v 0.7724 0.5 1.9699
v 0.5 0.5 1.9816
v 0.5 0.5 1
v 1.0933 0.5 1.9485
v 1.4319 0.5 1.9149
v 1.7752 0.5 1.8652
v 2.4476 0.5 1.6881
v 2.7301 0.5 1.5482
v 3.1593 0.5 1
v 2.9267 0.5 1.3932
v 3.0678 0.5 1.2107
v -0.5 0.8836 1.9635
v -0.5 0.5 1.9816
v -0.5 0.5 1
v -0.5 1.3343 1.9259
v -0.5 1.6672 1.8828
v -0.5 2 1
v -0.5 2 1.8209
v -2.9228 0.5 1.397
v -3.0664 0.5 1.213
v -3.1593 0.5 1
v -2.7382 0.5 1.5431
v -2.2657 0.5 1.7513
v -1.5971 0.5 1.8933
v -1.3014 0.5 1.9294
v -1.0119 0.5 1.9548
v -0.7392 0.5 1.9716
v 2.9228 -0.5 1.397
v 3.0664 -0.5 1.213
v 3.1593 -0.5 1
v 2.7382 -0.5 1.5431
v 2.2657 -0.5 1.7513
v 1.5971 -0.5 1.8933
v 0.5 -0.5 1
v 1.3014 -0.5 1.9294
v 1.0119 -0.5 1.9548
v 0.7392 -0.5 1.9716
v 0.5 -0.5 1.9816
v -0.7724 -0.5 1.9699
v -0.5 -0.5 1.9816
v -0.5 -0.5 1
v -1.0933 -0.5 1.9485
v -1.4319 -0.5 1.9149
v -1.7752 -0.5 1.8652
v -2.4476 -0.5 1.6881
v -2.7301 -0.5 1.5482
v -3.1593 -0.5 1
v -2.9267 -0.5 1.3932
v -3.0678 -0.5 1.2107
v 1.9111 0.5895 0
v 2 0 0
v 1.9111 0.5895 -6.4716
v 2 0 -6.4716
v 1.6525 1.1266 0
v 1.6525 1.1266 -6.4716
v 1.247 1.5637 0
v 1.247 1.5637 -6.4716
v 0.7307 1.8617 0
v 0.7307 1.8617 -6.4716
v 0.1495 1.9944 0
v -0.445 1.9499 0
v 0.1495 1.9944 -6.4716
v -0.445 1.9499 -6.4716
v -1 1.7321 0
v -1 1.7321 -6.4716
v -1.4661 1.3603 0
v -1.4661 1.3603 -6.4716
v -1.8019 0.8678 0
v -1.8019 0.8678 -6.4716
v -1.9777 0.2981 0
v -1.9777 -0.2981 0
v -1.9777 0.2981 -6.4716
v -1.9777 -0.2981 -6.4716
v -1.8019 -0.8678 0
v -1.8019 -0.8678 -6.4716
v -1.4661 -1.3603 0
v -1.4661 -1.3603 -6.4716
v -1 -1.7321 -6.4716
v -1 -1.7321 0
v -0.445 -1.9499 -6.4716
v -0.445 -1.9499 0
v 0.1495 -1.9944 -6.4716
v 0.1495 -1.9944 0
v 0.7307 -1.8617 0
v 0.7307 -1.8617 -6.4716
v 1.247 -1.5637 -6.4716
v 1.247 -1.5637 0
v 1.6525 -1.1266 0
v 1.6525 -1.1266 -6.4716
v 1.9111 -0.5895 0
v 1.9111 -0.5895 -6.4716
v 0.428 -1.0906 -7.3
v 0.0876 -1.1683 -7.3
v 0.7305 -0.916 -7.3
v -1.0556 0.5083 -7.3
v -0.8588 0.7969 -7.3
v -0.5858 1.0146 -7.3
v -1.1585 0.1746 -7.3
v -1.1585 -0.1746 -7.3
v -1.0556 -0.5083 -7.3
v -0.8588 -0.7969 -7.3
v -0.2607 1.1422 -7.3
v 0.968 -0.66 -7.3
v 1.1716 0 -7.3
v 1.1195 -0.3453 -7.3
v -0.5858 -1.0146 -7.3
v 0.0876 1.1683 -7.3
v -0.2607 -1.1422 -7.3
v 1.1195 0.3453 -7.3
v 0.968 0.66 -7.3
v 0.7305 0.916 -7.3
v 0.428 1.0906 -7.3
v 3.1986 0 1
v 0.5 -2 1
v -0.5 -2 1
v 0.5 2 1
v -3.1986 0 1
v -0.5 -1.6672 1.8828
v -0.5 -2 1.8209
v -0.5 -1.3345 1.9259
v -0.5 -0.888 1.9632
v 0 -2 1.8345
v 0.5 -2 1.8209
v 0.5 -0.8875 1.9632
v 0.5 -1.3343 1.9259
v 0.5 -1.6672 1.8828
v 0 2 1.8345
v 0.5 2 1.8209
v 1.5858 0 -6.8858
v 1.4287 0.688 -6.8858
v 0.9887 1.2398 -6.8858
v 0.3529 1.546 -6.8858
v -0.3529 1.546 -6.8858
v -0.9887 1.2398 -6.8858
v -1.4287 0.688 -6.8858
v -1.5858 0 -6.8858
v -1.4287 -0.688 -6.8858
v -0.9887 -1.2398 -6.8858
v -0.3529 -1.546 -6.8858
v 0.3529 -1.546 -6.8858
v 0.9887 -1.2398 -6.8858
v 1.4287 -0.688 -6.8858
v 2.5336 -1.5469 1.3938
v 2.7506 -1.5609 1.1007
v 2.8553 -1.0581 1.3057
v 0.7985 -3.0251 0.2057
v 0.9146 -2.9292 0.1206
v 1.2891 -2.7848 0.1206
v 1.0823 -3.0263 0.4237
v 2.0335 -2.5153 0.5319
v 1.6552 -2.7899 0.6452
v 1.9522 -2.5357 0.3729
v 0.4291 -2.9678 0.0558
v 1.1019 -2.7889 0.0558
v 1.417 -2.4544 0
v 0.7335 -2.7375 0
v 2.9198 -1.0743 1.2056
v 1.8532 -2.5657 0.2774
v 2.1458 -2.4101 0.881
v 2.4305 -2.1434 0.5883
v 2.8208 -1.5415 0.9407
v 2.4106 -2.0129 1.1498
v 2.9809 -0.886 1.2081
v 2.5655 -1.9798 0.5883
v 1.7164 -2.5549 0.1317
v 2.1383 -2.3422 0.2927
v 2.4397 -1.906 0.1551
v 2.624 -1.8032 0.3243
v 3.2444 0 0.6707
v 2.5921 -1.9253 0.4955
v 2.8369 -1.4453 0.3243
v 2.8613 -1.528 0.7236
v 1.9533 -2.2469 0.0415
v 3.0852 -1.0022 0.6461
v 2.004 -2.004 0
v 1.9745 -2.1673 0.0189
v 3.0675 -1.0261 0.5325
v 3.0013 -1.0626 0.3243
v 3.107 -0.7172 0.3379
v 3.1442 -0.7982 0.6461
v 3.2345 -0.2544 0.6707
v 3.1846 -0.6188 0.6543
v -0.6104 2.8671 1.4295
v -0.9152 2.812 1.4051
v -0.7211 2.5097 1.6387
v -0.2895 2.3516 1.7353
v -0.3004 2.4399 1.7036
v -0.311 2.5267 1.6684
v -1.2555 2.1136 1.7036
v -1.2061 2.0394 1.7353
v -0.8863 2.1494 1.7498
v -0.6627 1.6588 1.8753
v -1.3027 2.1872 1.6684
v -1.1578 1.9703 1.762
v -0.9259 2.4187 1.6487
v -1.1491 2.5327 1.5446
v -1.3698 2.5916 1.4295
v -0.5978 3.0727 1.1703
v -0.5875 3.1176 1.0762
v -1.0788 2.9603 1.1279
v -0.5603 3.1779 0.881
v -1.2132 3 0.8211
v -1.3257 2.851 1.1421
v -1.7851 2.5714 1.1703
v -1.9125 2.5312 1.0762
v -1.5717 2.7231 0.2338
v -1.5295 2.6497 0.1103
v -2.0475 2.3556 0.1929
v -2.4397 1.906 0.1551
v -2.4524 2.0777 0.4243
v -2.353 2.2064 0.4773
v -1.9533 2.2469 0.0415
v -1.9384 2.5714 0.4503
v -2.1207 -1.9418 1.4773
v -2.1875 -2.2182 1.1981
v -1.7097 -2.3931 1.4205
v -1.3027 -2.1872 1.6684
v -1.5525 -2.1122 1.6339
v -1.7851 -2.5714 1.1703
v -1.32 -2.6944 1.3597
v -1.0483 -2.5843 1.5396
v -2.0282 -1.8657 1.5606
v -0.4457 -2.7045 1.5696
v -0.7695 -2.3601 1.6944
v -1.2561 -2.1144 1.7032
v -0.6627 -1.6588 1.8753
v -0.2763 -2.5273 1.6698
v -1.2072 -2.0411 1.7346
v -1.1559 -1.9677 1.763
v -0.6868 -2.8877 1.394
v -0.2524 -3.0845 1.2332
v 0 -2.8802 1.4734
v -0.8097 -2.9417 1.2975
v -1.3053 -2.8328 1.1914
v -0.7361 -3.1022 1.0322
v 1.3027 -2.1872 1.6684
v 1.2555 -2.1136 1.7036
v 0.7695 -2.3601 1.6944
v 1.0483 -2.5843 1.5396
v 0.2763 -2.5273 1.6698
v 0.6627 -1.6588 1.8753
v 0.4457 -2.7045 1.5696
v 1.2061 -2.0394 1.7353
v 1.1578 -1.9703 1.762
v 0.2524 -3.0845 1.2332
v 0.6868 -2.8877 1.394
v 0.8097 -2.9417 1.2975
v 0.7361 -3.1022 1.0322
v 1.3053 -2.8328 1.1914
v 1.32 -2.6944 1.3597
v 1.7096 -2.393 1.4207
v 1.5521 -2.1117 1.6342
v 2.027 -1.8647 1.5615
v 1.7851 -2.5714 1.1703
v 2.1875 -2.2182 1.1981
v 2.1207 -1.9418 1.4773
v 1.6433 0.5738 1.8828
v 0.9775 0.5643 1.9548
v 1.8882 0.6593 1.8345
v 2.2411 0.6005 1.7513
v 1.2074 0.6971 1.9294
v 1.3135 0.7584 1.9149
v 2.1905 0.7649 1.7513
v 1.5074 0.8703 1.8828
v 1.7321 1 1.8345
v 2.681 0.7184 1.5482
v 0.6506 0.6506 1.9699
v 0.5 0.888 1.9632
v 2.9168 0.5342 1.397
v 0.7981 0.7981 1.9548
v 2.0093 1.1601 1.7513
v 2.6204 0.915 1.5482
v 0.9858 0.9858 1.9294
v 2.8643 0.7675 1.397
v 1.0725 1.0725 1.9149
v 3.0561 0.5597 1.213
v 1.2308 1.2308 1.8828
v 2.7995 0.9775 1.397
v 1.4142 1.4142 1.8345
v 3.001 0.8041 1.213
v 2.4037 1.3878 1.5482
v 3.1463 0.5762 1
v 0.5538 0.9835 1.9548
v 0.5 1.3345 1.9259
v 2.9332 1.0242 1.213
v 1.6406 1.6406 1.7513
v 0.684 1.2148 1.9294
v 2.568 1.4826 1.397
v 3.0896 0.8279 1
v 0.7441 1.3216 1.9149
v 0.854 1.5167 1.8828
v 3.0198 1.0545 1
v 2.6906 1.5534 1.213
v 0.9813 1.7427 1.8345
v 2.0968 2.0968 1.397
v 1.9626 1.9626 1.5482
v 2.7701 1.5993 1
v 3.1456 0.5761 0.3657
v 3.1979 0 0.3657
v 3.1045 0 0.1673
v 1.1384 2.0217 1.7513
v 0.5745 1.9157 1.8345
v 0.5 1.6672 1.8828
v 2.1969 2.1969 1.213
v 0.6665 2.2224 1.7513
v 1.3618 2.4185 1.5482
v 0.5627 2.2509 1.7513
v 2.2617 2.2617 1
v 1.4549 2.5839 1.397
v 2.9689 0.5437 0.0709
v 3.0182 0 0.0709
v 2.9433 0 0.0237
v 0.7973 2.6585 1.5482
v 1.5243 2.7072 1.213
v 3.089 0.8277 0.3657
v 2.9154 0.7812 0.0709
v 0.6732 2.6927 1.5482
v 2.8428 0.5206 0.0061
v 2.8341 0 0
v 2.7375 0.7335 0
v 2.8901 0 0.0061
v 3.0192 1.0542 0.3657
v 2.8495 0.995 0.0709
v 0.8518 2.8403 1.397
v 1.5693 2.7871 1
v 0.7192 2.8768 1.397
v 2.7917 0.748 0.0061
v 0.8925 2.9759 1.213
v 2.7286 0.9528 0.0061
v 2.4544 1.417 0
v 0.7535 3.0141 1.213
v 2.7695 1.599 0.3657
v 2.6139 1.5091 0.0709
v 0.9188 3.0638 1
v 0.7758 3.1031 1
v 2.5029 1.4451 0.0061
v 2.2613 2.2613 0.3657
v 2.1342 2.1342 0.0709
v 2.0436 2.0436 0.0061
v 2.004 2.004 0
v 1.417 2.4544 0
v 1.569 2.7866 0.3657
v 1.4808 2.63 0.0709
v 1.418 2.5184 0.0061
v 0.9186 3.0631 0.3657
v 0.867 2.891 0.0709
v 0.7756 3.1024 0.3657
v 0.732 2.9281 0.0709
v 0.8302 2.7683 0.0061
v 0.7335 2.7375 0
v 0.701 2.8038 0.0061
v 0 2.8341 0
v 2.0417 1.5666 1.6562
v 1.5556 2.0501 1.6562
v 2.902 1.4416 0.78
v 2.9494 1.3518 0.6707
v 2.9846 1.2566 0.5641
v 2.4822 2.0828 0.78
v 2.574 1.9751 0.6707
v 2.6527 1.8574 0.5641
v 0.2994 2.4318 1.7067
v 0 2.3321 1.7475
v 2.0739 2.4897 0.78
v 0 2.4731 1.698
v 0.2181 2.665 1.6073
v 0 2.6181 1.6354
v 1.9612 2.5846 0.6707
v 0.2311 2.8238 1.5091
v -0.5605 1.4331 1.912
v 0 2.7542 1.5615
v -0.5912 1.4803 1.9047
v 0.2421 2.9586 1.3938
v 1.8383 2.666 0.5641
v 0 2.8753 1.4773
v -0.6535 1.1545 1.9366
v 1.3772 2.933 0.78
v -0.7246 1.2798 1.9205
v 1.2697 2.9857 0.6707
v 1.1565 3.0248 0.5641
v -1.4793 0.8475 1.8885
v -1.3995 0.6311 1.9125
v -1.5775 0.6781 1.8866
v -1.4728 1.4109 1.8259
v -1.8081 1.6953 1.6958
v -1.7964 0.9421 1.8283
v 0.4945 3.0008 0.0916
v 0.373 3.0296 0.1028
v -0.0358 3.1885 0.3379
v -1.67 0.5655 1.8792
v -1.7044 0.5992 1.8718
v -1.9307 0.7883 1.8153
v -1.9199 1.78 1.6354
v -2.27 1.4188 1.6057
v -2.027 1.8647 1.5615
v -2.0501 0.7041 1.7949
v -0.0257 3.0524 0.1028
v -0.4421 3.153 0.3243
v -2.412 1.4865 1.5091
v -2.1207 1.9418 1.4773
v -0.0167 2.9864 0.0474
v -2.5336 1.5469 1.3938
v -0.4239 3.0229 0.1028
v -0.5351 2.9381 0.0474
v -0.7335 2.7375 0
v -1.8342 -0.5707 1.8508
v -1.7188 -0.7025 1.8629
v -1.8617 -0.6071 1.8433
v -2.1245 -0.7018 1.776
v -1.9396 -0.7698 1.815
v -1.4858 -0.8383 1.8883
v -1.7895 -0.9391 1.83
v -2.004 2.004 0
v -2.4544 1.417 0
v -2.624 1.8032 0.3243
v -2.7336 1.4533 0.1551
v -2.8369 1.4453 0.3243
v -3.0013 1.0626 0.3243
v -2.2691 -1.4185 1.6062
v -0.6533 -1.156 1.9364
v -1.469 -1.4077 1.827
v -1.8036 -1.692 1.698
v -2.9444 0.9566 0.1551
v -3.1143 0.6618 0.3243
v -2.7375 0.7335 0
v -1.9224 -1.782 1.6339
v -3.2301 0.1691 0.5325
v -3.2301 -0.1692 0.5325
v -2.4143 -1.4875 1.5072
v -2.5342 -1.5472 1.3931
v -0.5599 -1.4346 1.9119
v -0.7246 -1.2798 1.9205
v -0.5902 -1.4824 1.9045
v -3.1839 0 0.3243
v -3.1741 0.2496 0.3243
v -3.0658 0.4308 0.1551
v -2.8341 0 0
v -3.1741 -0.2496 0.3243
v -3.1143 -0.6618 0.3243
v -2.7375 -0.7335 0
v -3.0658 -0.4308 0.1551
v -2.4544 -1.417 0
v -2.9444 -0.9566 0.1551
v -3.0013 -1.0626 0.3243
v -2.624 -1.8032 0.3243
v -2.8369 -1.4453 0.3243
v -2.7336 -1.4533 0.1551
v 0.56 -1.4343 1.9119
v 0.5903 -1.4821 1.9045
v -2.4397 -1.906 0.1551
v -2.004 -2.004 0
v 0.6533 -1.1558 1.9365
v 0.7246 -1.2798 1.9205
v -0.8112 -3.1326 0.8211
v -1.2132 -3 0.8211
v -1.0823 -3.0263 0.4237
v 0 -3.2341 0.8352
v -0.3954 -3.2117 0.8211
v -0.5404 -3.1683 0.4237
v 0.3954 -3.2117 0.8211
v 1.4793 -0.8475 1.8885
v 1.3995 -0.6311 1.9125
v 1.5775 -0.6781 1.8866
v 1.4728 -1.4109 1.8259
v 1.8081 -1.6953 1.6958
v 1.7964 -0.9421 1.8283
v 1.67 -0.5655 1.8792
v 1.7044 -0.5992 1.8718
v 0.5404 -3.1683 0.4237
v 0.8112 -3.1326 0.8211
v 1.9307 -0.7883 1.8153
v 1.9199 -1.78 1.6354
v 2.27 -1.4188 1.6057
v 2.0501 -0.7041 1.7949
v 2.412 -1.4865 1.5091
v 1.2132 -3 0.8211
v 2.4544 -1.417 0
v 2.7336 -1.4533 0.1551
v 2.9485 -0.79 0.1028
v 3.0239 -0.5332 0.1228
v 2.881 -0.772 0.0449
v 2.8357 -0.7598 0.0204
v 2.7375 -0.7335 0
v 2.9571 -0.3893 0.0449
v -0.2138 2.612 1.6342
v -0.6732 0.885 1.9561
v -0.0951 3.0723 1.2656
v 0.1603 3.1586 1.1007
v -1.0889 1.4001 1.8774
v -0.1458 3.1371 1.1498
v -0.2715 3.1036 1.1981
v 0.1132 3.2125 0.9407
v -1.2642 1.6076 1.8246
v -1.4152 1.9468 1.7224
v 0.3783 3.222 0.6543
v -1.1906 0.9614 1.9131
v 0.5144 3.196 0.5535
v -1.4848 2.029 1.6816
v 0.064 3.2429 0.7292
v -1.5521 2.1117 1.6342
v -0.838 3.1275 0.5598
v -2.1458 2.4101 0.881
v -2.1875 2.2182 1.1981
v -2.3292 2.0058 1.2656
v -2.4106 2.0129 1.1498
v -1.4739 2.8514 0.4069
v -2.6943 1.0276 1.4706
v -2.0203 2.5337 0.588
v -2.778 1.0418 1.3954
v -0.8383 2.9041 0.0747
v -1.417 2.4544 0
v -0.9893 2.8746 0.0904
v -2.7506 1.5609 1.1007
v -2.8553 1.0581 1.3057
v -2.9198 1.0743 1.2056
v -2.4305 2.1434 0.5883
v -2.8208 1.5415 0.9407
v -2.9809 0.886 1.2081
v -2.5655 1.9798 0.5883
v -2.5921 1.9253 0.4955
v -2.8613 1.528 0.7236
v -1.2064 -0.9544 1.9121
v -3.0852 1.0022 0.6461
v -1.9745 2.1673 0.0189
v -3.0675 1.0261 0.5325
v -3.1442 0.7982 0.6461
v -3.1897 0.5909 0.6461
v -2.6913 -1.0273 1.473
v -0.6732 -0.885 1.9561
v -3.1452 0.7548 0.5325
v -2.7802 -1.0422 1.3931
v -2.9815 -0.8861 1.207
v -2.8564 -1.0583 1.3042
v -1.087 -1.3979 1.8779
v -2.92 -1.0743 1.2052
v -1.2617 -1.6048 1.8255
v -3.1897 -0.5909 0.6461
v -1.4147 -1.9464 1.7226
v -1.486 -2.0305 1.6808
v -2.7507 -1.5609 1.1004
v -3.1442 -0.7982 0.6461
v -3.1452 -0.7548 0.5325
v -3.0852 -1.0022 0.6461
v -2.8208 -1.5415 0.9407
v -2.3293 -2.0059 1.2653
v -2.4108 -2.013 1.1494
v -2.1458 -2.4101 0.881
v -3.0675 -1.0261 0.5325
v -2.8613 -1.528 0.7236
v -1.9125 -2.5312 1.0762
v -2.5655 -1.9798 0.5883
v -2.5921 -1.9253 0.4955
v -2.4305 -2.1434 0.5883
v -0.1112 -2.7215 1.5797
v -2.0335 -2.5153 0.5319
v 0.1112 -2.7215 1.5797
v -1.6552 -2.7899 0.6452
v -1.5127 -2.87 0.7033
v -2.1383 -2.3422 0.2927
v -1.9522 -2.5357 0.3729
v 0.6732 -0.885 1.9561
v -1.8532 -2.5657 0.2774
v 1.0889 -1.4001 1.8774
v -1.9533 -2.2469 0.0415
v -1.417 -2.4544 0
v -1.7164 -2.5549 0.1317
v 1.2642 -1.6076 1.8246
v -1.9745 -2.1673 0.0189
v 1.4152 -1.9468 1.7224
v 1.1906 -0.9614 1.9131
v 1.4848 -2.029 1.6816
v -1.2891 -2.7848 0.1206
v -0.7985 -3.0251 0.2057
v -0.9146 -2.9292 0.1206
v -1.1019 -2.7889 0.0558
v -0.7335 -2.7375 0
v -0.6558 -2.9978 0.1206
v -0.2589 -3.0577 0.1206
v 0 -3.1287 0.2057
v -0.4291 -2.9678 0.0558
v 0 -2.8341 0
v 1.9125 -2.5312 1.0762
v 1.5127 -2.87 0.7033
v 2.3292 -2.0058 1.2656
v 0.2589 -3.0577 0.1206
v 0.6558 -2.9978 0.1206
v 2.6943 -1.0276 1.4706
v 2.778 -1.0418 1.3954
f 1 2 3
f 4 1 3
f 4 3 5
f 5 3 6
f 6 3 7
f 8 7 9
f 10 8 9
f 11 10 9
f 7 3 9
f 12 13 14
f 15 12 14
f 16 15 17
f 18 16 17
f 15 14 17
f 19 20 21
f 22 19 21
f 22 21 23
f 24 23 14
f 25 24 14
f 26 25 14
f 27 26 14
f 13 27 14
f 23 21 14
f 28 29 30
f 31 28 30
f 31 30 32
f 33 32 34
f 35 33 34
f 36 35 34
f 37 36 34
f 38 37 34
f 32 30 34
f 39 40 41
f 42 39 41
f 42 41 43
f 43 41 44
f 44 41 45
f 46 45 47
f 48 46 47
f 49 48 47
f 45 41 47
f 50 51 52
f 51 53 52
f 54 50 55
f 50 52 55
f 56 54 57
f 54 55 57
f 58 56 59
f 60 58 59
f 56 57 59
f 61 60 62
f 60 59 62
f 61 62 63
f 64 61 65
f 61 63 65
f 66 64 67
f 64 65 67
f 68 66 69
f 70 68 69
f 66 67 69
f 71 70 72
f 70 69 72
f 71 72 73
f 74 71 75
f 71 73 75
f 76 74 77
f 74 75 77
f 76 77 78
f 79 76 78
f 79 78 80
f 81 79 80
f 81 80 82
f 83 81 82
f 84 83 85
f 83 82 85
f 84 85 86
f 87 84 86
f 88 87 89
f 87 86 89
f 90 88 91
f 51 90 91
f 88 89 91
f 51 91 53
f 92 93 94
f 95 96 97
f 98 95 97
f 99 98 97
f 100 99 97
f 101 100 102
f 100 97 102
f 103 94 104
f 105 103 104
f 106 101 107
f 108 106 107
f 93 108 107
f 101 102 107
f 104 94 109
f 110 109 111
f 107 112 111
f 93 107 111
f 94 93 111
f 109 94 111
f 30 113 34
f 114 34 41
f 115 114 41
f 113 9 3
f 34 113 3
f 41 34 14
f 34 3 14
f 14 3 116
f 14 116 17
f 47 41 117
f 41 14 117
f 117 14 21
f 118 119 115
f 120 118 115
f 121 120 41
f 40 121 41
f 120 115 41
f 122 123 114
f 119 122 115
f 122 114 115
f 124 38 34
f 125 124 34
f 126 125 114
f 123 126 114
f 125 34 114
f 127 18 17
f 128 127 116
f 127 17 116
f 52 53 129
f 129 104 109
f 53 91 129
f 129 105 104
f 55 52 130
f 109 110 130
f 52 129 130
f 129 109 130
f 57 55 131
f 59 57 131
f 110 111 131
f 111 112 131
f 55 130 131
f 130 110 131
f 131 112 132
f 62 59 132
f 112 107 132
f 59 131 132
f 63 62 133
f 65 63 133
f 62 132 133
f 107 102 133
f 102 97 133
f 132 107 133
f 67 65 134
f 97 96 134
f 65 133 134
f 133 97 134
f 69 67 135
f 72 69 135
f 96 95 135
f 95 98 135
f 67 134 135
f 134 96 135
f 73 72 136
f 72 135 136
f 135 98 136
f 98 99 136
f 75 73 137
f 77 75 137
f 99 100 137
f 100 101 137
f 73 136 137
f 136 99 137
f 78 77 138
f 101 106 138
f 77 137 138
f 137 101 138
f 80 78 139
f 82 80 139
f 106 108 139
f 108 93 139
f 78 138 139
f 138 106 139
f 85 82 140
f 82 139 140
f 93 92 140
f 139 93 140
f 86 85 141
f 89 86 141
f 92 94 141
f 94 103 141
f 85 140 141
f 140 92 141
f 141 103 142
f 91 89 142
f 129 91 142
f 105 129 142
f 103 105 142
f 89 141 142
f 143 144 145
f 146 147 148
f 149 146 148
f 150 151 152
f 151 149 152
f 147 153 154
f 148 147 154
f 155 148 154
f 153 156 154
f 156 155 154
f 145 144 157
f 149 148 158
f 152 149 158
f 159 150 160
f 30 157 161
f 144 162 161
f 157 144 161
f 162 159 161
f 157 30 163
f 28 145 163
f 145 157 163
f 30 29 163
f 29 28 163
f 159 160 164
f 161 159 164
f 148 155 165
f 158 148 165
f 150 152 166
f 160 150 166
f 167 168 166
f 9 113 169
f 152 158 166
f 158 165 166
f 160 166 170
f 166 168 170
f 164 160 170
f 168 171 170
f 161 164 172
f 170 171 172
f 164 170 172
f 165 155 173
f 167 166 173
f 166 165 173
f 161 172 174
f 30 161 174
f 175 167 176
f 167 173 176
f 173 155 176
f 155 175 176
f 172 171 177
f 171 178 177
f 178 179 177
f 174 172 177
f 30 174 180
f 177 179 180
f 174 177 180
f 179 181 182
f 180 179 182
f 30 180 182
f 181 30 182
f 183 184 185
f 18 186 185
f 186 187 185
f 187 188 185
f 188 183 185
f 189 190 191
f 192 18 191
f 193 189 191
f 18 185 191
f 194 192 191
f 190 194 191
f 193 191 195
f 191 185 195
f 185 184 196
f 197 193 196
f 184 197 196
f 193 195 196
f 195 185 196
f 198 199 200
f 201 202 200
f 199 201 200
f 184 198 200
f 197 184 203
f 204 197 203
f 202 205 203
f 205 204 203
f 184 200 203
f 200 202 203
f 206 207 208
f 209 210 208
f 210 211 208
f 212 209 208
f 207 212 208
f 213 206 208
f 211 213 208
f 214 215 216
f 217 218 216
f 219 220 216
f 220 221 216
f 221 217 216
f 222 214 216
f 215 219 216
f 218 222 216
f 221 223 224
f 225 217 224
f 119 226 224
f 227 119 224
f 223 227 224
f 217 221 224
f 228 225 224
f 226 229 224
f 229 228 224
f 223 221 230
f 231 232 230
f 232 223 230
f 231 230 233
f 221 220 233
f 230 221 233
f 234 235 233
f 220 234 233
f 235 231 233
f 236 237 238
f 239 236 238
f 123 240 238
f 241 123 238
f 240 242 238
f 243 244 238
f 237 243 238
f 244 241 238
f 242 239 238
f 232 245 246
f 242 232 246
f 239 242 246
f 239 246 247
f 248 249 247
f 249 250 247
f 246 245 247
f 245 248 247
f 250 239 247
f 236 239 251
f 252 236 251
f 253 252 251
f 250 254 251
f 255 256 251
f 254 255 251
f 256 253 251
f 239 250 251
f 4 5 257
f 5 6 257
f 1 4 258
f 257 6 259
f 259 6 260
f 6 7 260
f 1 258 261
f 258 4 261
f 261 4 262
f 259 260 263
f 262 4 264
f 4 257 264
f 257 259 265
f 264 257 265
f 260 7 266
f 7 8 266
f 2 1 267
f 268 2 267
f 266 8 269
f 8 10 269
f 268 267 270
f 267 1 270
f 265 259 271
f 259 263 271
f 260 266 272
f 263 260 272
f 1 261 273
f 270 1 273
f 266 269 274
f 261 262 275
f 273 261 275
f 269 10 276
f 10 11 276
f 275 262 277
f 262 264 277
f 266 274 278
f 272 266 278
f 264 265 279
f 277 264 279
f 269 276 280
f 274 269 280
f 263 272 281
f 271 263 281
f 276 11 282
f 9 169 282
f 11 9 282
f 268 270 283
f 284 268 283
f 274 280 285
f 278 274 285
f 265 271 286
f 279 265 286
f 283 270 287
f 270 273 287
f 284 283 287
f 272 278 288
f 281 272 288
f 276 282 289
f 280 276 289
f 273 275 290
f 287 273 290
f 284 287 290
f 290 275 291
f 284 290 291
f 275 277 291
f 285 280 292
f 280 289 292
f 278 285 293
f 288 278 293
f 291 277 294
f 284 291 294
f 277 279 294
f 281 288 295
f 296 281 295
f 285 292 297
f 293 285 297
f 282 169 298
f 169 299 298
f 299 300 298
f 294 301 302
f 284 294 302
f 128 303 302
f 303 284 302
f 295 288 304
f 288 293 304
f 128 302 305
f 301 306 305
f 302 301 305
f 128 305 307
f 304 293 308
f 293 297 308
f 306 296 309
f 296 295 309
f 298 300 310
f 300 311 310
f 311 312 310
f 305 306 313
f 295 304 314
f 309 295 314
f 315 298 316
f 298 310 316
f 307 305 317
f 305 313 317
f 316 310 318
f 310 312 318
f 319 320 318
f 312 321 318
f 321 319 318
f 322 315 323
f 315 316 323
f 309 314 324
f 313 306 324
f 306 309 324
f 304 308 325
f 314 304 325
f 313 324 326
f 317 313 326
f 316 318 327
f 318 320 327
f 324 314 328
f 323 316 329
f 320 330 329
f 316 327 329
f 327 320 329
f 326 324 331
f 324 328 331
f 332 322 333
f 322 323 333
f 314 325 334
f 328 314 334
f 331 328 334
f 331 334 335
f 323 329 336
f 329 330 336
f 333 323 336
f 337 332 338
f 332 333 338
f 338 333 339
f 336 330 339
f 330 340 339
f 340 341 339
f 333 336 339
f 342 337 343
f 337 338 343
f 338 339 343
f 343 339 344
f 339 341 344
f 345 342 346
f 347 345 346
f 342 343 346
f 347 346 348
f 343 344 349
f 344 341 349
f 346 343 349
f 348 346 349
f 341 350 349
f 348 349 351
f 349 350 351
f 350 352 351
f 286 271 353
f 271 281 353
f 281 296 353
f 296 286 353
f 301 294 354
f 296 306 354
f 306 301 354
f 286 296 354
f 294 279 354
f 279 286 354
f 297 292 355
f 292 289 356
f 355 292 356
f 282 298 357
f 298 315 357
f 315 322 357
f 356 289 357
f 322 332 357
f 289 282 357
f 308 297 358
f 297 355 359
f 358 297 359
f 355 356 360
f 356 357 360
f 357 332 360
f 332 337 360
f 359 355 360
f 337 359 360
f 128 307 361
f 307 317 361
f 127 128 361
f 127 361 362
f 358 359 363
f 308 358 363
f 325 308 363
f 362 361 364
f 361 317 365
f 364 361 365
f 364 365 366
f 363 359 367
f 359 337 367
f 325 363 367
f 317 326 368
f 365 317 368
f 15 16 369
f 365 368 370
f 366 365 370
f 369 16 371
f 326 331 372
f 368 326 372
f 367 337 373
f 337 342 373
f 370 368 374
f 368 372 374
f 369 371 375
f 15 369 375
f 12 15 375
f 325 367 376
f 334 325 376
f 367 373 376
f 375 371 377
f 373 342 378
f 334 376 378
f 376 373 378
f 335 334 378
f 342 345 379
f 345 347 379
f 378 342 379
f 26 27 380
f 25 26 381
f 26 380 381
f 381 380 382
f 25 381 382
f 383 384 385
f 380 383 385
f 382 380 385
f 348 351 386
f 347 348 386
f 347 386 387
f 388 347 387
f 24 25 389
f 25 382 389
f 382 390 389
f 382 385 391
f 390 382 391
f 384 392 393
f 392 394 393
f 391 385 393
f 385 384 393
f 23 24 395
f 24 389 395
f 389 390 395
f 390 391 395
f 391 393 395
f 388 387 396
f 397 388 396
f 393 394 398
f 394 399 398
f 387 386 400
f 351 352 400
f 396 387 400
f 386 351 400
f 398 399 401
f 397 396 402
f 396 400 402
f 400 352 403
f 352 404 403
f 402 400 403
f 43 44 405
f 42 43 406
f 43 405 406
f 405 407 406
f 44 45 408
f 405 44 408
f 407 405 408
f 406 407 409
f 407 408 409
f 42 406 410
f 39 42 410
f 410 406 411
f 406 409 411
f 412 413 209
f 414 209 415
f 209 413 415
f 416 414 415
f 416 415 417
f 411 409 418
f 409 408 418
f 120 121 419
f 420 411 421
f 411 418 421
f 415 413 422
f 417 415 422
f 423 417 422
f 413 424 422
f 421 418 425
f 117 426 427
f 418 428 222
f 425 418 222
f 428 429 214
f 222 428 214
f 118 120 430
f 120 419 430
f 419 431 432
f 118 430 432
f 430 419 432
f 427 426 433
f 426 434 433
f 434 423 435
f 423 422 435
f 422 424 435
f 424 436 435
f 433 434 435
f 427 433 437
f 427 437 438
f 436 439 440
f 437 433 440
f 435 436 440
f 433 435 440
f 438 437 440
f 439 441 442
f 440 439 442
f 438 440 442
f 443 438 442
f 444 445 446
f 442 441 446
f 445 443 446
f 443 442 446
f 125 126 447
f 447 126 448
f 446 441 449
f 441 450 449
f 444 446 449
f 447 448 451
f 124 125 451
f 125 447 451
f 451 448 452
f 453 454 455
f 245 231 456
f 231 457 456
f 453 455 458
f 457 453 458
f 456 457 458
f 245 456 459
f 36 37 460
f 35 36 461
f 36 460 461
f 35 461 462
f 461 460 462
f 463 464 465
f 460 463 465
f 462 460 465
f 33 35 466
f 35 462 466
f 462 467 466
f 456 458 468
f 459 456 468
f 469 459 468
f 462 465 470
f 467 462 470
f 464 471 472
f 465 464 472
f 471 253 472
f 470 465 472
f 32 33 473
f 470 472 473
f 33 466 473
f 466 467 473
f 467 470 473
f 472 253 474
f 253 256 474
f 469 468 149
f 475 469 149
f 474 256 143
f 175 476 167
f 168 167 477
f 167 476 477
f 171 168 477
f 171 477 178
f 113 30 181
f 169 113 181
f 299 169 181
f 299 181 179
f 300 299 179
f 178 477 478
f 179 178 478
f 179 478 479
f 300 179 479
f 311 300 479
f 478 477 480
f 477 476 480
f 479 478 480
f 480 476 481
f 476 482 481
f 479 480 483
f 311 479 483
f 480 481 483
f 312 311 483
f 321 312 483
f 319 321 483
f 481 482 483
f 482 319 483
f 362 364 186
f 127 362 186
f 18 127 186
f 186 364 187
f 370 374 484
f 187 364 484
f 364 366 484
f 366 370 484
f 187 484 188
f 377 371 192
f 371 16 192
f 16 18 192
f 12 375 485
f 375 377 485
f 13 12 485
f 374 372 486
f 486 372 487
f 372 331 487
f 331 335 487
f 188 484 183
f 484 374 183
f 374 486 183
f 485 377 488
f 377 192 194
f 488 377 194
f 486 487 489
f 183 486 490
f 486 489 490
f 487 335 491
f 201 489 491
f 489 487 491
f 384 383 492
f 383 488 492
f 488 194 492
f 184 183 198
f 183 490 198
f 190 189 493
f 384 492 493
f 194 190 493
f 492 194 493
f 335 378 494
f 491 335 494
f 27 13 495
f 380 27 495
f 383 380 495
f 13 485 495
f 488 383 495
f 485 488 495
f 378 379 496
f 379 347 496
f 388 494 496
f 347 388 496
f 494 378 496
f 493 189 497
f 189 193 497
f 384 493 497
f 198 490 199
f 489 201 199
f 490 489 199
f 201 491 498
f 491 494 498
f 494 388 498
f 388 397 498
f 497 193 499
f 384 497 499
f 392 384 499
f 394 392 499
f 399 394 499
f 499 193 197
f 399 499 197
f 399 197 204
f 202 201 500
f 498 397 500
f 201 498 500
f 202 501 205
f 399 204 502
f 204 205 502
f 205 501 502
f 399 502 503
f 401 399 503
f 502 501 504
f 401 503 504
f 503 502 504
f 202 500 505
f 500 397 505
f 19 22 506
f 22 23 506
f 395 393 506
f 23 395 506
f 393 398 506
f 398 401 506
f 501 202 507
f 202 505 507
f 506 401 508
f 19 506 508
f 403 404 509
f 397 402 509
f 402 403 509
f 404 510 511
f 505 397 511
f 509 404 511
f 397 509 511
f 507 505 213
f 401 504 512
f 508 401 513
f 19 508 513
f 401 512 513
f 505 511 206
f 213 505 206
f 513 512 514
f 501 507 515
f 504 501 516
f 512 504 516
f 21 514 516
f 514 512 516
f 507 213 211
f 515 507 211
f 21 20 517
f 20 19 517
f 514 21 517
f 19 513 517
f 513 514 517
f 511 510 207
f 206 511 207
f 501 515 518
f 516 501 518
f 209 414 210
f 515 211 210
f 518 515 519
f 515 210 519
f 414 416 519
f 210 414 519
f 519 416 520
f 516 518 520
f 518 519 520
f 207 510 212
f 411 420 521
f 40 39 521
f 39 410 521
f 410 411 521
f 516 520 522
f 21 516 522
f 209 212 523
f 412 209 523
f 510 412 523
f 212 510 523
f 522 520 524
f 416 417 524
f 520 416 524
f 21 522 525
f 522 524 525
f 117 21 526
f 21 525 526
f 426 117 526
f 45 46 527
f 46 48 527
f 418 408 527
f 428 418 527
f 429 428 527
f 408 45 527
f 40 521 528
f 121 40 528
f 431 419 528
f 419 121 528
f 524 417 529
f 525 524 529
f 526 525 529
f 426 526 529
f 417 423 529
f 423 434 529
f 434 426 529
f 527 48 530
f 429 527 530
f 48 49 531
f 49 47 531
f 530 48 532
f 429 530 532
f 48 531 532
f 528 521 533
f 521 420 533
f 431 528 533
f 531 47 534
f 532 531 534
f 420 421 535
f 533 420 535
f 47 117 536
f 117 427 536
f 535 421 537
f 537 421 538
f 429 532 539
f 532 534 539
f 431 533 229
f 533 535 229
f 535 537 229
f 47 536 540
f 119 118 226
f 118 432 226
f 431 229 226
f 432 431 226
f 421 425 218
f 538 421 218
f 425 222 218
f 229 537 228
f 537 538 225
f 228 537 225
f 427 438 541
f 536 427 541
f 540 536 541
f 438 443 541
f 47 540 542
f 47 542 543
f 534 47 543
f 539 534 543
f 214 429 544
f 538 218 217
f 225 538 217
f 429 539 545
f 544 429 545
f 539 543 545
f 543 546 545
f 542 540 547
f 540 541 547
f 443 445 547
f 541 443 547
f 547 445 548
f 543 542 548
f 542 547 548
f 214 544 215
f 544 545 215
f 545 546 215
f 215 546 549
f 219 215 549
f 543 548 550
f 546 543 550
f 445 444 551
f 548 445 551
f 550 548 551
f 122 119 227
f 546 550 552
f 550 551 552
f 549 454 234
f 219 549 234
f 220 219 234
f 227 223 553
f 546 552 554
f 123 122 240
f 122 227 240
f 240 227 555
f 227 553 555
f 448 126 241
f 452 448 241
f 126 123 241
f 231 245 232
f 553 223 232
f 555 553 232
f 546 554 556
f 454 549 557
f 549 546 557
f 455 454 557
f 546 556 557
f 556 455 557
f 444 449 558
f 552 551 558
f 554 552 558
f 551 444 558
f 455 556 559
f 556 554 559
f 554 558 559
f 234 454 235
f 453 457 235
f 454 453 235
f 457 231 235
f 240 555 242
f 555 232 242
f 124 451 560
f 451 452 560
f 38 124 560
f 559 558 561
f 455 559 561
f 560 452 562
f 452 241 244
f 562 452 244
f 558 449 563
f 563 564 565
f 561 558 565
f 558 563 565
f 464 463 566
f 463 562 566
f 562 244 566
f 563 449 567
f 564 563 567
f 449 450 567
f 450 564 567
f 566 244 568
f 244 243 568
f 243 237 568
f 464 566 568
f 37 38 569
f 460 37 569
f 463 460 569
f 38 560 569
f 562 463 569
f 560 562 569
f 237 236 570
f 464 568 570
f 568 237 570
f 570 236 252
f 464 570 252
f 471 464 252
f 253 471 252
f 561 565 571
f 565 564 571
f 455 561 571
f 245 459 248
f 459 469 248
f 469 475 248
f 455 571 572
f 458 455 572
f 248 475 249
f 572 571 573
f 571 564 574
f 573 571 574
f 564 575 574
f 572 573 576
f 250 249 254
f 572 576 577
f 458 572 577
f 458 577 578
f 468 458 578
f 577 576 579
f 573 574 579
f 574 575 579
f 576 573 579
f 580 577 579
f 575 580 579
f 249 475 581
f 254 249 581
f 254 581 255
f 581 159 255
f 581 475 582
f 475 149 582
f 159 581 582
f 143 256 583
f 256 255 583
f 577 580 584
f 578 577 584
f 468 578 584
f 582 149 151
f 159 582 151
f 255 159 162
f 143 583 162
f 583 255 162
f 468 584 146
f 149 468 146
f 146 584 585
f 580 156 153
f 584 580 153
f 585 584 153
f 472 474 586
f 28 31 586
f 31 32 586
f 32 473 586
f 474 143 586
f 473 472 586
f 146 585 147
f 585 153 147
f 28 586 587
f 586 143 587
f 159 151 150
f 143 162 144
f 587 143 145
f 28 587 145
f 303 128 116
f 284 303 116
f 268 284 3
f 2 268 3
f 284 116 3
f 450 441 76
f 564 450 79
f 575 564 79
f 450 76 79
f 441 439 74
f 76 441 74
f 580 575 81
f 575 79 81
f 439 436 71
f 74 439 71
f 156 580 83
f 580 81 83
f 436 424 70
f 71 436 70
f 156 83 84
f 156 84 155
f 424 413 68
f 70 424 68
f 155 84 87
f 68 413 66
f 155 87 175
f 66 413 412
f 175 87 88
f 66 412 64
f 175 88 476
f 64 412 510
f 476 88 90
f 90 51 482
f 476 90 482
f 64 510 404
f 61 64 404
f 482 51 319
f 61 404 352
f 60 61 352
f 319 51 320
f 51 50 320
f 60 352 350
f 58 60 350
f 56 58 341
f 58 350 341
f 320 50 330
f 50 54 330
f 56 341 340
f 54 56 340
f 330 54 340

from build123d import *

# Parameters (mm, degrees)
POCKET_DEPTH = 5


with BuildPart() as part:
    # Sketch → Revolution (revolve)
    with BuildSketch(Plane.XZ):
        with BuildLine():
            add(Edge.make_bspline(
                [(0, 2), (2.227338, 1.983256), (3.586166, 1.297371), (3.17254, 0), (2.834081, 0)],
                knots=[0, 0, 0, 0, 0.5, 1, 1, 1, 1], degree=3))
            Line((2.834081, 0), (2, 0))
            Line((2, 0), (2, -6.471573))
            Line((2, -6.471573), (1.171573, -7.3))
            Line((1.171573, -7.3), (0, -7.3))
            Line((0, -7.3), (0, 2))
        make_face()
    revolve(axis=Axis((0, 0, 0), (0, 0, 1)))

    # Sketch001 → Pocket (cut)
    with BuildSketch(Plane.XY.offset(1)):
        Polygon((-3.5, 0.5), (-0.5, 0.5), (-0.5, 2), (0.5, 2), (0.5, 0.5), (3.5, 0.5), (3.5, -0.5), (0.5, -0.5), (0.5, -2), (-0.5, -2), (-0.5, -0.5), (-3.5, -0.5), align=None)
    extrude(amount=POCKET_DEPTH, mode=Mode.SUBTRACT)


solid = part.part
